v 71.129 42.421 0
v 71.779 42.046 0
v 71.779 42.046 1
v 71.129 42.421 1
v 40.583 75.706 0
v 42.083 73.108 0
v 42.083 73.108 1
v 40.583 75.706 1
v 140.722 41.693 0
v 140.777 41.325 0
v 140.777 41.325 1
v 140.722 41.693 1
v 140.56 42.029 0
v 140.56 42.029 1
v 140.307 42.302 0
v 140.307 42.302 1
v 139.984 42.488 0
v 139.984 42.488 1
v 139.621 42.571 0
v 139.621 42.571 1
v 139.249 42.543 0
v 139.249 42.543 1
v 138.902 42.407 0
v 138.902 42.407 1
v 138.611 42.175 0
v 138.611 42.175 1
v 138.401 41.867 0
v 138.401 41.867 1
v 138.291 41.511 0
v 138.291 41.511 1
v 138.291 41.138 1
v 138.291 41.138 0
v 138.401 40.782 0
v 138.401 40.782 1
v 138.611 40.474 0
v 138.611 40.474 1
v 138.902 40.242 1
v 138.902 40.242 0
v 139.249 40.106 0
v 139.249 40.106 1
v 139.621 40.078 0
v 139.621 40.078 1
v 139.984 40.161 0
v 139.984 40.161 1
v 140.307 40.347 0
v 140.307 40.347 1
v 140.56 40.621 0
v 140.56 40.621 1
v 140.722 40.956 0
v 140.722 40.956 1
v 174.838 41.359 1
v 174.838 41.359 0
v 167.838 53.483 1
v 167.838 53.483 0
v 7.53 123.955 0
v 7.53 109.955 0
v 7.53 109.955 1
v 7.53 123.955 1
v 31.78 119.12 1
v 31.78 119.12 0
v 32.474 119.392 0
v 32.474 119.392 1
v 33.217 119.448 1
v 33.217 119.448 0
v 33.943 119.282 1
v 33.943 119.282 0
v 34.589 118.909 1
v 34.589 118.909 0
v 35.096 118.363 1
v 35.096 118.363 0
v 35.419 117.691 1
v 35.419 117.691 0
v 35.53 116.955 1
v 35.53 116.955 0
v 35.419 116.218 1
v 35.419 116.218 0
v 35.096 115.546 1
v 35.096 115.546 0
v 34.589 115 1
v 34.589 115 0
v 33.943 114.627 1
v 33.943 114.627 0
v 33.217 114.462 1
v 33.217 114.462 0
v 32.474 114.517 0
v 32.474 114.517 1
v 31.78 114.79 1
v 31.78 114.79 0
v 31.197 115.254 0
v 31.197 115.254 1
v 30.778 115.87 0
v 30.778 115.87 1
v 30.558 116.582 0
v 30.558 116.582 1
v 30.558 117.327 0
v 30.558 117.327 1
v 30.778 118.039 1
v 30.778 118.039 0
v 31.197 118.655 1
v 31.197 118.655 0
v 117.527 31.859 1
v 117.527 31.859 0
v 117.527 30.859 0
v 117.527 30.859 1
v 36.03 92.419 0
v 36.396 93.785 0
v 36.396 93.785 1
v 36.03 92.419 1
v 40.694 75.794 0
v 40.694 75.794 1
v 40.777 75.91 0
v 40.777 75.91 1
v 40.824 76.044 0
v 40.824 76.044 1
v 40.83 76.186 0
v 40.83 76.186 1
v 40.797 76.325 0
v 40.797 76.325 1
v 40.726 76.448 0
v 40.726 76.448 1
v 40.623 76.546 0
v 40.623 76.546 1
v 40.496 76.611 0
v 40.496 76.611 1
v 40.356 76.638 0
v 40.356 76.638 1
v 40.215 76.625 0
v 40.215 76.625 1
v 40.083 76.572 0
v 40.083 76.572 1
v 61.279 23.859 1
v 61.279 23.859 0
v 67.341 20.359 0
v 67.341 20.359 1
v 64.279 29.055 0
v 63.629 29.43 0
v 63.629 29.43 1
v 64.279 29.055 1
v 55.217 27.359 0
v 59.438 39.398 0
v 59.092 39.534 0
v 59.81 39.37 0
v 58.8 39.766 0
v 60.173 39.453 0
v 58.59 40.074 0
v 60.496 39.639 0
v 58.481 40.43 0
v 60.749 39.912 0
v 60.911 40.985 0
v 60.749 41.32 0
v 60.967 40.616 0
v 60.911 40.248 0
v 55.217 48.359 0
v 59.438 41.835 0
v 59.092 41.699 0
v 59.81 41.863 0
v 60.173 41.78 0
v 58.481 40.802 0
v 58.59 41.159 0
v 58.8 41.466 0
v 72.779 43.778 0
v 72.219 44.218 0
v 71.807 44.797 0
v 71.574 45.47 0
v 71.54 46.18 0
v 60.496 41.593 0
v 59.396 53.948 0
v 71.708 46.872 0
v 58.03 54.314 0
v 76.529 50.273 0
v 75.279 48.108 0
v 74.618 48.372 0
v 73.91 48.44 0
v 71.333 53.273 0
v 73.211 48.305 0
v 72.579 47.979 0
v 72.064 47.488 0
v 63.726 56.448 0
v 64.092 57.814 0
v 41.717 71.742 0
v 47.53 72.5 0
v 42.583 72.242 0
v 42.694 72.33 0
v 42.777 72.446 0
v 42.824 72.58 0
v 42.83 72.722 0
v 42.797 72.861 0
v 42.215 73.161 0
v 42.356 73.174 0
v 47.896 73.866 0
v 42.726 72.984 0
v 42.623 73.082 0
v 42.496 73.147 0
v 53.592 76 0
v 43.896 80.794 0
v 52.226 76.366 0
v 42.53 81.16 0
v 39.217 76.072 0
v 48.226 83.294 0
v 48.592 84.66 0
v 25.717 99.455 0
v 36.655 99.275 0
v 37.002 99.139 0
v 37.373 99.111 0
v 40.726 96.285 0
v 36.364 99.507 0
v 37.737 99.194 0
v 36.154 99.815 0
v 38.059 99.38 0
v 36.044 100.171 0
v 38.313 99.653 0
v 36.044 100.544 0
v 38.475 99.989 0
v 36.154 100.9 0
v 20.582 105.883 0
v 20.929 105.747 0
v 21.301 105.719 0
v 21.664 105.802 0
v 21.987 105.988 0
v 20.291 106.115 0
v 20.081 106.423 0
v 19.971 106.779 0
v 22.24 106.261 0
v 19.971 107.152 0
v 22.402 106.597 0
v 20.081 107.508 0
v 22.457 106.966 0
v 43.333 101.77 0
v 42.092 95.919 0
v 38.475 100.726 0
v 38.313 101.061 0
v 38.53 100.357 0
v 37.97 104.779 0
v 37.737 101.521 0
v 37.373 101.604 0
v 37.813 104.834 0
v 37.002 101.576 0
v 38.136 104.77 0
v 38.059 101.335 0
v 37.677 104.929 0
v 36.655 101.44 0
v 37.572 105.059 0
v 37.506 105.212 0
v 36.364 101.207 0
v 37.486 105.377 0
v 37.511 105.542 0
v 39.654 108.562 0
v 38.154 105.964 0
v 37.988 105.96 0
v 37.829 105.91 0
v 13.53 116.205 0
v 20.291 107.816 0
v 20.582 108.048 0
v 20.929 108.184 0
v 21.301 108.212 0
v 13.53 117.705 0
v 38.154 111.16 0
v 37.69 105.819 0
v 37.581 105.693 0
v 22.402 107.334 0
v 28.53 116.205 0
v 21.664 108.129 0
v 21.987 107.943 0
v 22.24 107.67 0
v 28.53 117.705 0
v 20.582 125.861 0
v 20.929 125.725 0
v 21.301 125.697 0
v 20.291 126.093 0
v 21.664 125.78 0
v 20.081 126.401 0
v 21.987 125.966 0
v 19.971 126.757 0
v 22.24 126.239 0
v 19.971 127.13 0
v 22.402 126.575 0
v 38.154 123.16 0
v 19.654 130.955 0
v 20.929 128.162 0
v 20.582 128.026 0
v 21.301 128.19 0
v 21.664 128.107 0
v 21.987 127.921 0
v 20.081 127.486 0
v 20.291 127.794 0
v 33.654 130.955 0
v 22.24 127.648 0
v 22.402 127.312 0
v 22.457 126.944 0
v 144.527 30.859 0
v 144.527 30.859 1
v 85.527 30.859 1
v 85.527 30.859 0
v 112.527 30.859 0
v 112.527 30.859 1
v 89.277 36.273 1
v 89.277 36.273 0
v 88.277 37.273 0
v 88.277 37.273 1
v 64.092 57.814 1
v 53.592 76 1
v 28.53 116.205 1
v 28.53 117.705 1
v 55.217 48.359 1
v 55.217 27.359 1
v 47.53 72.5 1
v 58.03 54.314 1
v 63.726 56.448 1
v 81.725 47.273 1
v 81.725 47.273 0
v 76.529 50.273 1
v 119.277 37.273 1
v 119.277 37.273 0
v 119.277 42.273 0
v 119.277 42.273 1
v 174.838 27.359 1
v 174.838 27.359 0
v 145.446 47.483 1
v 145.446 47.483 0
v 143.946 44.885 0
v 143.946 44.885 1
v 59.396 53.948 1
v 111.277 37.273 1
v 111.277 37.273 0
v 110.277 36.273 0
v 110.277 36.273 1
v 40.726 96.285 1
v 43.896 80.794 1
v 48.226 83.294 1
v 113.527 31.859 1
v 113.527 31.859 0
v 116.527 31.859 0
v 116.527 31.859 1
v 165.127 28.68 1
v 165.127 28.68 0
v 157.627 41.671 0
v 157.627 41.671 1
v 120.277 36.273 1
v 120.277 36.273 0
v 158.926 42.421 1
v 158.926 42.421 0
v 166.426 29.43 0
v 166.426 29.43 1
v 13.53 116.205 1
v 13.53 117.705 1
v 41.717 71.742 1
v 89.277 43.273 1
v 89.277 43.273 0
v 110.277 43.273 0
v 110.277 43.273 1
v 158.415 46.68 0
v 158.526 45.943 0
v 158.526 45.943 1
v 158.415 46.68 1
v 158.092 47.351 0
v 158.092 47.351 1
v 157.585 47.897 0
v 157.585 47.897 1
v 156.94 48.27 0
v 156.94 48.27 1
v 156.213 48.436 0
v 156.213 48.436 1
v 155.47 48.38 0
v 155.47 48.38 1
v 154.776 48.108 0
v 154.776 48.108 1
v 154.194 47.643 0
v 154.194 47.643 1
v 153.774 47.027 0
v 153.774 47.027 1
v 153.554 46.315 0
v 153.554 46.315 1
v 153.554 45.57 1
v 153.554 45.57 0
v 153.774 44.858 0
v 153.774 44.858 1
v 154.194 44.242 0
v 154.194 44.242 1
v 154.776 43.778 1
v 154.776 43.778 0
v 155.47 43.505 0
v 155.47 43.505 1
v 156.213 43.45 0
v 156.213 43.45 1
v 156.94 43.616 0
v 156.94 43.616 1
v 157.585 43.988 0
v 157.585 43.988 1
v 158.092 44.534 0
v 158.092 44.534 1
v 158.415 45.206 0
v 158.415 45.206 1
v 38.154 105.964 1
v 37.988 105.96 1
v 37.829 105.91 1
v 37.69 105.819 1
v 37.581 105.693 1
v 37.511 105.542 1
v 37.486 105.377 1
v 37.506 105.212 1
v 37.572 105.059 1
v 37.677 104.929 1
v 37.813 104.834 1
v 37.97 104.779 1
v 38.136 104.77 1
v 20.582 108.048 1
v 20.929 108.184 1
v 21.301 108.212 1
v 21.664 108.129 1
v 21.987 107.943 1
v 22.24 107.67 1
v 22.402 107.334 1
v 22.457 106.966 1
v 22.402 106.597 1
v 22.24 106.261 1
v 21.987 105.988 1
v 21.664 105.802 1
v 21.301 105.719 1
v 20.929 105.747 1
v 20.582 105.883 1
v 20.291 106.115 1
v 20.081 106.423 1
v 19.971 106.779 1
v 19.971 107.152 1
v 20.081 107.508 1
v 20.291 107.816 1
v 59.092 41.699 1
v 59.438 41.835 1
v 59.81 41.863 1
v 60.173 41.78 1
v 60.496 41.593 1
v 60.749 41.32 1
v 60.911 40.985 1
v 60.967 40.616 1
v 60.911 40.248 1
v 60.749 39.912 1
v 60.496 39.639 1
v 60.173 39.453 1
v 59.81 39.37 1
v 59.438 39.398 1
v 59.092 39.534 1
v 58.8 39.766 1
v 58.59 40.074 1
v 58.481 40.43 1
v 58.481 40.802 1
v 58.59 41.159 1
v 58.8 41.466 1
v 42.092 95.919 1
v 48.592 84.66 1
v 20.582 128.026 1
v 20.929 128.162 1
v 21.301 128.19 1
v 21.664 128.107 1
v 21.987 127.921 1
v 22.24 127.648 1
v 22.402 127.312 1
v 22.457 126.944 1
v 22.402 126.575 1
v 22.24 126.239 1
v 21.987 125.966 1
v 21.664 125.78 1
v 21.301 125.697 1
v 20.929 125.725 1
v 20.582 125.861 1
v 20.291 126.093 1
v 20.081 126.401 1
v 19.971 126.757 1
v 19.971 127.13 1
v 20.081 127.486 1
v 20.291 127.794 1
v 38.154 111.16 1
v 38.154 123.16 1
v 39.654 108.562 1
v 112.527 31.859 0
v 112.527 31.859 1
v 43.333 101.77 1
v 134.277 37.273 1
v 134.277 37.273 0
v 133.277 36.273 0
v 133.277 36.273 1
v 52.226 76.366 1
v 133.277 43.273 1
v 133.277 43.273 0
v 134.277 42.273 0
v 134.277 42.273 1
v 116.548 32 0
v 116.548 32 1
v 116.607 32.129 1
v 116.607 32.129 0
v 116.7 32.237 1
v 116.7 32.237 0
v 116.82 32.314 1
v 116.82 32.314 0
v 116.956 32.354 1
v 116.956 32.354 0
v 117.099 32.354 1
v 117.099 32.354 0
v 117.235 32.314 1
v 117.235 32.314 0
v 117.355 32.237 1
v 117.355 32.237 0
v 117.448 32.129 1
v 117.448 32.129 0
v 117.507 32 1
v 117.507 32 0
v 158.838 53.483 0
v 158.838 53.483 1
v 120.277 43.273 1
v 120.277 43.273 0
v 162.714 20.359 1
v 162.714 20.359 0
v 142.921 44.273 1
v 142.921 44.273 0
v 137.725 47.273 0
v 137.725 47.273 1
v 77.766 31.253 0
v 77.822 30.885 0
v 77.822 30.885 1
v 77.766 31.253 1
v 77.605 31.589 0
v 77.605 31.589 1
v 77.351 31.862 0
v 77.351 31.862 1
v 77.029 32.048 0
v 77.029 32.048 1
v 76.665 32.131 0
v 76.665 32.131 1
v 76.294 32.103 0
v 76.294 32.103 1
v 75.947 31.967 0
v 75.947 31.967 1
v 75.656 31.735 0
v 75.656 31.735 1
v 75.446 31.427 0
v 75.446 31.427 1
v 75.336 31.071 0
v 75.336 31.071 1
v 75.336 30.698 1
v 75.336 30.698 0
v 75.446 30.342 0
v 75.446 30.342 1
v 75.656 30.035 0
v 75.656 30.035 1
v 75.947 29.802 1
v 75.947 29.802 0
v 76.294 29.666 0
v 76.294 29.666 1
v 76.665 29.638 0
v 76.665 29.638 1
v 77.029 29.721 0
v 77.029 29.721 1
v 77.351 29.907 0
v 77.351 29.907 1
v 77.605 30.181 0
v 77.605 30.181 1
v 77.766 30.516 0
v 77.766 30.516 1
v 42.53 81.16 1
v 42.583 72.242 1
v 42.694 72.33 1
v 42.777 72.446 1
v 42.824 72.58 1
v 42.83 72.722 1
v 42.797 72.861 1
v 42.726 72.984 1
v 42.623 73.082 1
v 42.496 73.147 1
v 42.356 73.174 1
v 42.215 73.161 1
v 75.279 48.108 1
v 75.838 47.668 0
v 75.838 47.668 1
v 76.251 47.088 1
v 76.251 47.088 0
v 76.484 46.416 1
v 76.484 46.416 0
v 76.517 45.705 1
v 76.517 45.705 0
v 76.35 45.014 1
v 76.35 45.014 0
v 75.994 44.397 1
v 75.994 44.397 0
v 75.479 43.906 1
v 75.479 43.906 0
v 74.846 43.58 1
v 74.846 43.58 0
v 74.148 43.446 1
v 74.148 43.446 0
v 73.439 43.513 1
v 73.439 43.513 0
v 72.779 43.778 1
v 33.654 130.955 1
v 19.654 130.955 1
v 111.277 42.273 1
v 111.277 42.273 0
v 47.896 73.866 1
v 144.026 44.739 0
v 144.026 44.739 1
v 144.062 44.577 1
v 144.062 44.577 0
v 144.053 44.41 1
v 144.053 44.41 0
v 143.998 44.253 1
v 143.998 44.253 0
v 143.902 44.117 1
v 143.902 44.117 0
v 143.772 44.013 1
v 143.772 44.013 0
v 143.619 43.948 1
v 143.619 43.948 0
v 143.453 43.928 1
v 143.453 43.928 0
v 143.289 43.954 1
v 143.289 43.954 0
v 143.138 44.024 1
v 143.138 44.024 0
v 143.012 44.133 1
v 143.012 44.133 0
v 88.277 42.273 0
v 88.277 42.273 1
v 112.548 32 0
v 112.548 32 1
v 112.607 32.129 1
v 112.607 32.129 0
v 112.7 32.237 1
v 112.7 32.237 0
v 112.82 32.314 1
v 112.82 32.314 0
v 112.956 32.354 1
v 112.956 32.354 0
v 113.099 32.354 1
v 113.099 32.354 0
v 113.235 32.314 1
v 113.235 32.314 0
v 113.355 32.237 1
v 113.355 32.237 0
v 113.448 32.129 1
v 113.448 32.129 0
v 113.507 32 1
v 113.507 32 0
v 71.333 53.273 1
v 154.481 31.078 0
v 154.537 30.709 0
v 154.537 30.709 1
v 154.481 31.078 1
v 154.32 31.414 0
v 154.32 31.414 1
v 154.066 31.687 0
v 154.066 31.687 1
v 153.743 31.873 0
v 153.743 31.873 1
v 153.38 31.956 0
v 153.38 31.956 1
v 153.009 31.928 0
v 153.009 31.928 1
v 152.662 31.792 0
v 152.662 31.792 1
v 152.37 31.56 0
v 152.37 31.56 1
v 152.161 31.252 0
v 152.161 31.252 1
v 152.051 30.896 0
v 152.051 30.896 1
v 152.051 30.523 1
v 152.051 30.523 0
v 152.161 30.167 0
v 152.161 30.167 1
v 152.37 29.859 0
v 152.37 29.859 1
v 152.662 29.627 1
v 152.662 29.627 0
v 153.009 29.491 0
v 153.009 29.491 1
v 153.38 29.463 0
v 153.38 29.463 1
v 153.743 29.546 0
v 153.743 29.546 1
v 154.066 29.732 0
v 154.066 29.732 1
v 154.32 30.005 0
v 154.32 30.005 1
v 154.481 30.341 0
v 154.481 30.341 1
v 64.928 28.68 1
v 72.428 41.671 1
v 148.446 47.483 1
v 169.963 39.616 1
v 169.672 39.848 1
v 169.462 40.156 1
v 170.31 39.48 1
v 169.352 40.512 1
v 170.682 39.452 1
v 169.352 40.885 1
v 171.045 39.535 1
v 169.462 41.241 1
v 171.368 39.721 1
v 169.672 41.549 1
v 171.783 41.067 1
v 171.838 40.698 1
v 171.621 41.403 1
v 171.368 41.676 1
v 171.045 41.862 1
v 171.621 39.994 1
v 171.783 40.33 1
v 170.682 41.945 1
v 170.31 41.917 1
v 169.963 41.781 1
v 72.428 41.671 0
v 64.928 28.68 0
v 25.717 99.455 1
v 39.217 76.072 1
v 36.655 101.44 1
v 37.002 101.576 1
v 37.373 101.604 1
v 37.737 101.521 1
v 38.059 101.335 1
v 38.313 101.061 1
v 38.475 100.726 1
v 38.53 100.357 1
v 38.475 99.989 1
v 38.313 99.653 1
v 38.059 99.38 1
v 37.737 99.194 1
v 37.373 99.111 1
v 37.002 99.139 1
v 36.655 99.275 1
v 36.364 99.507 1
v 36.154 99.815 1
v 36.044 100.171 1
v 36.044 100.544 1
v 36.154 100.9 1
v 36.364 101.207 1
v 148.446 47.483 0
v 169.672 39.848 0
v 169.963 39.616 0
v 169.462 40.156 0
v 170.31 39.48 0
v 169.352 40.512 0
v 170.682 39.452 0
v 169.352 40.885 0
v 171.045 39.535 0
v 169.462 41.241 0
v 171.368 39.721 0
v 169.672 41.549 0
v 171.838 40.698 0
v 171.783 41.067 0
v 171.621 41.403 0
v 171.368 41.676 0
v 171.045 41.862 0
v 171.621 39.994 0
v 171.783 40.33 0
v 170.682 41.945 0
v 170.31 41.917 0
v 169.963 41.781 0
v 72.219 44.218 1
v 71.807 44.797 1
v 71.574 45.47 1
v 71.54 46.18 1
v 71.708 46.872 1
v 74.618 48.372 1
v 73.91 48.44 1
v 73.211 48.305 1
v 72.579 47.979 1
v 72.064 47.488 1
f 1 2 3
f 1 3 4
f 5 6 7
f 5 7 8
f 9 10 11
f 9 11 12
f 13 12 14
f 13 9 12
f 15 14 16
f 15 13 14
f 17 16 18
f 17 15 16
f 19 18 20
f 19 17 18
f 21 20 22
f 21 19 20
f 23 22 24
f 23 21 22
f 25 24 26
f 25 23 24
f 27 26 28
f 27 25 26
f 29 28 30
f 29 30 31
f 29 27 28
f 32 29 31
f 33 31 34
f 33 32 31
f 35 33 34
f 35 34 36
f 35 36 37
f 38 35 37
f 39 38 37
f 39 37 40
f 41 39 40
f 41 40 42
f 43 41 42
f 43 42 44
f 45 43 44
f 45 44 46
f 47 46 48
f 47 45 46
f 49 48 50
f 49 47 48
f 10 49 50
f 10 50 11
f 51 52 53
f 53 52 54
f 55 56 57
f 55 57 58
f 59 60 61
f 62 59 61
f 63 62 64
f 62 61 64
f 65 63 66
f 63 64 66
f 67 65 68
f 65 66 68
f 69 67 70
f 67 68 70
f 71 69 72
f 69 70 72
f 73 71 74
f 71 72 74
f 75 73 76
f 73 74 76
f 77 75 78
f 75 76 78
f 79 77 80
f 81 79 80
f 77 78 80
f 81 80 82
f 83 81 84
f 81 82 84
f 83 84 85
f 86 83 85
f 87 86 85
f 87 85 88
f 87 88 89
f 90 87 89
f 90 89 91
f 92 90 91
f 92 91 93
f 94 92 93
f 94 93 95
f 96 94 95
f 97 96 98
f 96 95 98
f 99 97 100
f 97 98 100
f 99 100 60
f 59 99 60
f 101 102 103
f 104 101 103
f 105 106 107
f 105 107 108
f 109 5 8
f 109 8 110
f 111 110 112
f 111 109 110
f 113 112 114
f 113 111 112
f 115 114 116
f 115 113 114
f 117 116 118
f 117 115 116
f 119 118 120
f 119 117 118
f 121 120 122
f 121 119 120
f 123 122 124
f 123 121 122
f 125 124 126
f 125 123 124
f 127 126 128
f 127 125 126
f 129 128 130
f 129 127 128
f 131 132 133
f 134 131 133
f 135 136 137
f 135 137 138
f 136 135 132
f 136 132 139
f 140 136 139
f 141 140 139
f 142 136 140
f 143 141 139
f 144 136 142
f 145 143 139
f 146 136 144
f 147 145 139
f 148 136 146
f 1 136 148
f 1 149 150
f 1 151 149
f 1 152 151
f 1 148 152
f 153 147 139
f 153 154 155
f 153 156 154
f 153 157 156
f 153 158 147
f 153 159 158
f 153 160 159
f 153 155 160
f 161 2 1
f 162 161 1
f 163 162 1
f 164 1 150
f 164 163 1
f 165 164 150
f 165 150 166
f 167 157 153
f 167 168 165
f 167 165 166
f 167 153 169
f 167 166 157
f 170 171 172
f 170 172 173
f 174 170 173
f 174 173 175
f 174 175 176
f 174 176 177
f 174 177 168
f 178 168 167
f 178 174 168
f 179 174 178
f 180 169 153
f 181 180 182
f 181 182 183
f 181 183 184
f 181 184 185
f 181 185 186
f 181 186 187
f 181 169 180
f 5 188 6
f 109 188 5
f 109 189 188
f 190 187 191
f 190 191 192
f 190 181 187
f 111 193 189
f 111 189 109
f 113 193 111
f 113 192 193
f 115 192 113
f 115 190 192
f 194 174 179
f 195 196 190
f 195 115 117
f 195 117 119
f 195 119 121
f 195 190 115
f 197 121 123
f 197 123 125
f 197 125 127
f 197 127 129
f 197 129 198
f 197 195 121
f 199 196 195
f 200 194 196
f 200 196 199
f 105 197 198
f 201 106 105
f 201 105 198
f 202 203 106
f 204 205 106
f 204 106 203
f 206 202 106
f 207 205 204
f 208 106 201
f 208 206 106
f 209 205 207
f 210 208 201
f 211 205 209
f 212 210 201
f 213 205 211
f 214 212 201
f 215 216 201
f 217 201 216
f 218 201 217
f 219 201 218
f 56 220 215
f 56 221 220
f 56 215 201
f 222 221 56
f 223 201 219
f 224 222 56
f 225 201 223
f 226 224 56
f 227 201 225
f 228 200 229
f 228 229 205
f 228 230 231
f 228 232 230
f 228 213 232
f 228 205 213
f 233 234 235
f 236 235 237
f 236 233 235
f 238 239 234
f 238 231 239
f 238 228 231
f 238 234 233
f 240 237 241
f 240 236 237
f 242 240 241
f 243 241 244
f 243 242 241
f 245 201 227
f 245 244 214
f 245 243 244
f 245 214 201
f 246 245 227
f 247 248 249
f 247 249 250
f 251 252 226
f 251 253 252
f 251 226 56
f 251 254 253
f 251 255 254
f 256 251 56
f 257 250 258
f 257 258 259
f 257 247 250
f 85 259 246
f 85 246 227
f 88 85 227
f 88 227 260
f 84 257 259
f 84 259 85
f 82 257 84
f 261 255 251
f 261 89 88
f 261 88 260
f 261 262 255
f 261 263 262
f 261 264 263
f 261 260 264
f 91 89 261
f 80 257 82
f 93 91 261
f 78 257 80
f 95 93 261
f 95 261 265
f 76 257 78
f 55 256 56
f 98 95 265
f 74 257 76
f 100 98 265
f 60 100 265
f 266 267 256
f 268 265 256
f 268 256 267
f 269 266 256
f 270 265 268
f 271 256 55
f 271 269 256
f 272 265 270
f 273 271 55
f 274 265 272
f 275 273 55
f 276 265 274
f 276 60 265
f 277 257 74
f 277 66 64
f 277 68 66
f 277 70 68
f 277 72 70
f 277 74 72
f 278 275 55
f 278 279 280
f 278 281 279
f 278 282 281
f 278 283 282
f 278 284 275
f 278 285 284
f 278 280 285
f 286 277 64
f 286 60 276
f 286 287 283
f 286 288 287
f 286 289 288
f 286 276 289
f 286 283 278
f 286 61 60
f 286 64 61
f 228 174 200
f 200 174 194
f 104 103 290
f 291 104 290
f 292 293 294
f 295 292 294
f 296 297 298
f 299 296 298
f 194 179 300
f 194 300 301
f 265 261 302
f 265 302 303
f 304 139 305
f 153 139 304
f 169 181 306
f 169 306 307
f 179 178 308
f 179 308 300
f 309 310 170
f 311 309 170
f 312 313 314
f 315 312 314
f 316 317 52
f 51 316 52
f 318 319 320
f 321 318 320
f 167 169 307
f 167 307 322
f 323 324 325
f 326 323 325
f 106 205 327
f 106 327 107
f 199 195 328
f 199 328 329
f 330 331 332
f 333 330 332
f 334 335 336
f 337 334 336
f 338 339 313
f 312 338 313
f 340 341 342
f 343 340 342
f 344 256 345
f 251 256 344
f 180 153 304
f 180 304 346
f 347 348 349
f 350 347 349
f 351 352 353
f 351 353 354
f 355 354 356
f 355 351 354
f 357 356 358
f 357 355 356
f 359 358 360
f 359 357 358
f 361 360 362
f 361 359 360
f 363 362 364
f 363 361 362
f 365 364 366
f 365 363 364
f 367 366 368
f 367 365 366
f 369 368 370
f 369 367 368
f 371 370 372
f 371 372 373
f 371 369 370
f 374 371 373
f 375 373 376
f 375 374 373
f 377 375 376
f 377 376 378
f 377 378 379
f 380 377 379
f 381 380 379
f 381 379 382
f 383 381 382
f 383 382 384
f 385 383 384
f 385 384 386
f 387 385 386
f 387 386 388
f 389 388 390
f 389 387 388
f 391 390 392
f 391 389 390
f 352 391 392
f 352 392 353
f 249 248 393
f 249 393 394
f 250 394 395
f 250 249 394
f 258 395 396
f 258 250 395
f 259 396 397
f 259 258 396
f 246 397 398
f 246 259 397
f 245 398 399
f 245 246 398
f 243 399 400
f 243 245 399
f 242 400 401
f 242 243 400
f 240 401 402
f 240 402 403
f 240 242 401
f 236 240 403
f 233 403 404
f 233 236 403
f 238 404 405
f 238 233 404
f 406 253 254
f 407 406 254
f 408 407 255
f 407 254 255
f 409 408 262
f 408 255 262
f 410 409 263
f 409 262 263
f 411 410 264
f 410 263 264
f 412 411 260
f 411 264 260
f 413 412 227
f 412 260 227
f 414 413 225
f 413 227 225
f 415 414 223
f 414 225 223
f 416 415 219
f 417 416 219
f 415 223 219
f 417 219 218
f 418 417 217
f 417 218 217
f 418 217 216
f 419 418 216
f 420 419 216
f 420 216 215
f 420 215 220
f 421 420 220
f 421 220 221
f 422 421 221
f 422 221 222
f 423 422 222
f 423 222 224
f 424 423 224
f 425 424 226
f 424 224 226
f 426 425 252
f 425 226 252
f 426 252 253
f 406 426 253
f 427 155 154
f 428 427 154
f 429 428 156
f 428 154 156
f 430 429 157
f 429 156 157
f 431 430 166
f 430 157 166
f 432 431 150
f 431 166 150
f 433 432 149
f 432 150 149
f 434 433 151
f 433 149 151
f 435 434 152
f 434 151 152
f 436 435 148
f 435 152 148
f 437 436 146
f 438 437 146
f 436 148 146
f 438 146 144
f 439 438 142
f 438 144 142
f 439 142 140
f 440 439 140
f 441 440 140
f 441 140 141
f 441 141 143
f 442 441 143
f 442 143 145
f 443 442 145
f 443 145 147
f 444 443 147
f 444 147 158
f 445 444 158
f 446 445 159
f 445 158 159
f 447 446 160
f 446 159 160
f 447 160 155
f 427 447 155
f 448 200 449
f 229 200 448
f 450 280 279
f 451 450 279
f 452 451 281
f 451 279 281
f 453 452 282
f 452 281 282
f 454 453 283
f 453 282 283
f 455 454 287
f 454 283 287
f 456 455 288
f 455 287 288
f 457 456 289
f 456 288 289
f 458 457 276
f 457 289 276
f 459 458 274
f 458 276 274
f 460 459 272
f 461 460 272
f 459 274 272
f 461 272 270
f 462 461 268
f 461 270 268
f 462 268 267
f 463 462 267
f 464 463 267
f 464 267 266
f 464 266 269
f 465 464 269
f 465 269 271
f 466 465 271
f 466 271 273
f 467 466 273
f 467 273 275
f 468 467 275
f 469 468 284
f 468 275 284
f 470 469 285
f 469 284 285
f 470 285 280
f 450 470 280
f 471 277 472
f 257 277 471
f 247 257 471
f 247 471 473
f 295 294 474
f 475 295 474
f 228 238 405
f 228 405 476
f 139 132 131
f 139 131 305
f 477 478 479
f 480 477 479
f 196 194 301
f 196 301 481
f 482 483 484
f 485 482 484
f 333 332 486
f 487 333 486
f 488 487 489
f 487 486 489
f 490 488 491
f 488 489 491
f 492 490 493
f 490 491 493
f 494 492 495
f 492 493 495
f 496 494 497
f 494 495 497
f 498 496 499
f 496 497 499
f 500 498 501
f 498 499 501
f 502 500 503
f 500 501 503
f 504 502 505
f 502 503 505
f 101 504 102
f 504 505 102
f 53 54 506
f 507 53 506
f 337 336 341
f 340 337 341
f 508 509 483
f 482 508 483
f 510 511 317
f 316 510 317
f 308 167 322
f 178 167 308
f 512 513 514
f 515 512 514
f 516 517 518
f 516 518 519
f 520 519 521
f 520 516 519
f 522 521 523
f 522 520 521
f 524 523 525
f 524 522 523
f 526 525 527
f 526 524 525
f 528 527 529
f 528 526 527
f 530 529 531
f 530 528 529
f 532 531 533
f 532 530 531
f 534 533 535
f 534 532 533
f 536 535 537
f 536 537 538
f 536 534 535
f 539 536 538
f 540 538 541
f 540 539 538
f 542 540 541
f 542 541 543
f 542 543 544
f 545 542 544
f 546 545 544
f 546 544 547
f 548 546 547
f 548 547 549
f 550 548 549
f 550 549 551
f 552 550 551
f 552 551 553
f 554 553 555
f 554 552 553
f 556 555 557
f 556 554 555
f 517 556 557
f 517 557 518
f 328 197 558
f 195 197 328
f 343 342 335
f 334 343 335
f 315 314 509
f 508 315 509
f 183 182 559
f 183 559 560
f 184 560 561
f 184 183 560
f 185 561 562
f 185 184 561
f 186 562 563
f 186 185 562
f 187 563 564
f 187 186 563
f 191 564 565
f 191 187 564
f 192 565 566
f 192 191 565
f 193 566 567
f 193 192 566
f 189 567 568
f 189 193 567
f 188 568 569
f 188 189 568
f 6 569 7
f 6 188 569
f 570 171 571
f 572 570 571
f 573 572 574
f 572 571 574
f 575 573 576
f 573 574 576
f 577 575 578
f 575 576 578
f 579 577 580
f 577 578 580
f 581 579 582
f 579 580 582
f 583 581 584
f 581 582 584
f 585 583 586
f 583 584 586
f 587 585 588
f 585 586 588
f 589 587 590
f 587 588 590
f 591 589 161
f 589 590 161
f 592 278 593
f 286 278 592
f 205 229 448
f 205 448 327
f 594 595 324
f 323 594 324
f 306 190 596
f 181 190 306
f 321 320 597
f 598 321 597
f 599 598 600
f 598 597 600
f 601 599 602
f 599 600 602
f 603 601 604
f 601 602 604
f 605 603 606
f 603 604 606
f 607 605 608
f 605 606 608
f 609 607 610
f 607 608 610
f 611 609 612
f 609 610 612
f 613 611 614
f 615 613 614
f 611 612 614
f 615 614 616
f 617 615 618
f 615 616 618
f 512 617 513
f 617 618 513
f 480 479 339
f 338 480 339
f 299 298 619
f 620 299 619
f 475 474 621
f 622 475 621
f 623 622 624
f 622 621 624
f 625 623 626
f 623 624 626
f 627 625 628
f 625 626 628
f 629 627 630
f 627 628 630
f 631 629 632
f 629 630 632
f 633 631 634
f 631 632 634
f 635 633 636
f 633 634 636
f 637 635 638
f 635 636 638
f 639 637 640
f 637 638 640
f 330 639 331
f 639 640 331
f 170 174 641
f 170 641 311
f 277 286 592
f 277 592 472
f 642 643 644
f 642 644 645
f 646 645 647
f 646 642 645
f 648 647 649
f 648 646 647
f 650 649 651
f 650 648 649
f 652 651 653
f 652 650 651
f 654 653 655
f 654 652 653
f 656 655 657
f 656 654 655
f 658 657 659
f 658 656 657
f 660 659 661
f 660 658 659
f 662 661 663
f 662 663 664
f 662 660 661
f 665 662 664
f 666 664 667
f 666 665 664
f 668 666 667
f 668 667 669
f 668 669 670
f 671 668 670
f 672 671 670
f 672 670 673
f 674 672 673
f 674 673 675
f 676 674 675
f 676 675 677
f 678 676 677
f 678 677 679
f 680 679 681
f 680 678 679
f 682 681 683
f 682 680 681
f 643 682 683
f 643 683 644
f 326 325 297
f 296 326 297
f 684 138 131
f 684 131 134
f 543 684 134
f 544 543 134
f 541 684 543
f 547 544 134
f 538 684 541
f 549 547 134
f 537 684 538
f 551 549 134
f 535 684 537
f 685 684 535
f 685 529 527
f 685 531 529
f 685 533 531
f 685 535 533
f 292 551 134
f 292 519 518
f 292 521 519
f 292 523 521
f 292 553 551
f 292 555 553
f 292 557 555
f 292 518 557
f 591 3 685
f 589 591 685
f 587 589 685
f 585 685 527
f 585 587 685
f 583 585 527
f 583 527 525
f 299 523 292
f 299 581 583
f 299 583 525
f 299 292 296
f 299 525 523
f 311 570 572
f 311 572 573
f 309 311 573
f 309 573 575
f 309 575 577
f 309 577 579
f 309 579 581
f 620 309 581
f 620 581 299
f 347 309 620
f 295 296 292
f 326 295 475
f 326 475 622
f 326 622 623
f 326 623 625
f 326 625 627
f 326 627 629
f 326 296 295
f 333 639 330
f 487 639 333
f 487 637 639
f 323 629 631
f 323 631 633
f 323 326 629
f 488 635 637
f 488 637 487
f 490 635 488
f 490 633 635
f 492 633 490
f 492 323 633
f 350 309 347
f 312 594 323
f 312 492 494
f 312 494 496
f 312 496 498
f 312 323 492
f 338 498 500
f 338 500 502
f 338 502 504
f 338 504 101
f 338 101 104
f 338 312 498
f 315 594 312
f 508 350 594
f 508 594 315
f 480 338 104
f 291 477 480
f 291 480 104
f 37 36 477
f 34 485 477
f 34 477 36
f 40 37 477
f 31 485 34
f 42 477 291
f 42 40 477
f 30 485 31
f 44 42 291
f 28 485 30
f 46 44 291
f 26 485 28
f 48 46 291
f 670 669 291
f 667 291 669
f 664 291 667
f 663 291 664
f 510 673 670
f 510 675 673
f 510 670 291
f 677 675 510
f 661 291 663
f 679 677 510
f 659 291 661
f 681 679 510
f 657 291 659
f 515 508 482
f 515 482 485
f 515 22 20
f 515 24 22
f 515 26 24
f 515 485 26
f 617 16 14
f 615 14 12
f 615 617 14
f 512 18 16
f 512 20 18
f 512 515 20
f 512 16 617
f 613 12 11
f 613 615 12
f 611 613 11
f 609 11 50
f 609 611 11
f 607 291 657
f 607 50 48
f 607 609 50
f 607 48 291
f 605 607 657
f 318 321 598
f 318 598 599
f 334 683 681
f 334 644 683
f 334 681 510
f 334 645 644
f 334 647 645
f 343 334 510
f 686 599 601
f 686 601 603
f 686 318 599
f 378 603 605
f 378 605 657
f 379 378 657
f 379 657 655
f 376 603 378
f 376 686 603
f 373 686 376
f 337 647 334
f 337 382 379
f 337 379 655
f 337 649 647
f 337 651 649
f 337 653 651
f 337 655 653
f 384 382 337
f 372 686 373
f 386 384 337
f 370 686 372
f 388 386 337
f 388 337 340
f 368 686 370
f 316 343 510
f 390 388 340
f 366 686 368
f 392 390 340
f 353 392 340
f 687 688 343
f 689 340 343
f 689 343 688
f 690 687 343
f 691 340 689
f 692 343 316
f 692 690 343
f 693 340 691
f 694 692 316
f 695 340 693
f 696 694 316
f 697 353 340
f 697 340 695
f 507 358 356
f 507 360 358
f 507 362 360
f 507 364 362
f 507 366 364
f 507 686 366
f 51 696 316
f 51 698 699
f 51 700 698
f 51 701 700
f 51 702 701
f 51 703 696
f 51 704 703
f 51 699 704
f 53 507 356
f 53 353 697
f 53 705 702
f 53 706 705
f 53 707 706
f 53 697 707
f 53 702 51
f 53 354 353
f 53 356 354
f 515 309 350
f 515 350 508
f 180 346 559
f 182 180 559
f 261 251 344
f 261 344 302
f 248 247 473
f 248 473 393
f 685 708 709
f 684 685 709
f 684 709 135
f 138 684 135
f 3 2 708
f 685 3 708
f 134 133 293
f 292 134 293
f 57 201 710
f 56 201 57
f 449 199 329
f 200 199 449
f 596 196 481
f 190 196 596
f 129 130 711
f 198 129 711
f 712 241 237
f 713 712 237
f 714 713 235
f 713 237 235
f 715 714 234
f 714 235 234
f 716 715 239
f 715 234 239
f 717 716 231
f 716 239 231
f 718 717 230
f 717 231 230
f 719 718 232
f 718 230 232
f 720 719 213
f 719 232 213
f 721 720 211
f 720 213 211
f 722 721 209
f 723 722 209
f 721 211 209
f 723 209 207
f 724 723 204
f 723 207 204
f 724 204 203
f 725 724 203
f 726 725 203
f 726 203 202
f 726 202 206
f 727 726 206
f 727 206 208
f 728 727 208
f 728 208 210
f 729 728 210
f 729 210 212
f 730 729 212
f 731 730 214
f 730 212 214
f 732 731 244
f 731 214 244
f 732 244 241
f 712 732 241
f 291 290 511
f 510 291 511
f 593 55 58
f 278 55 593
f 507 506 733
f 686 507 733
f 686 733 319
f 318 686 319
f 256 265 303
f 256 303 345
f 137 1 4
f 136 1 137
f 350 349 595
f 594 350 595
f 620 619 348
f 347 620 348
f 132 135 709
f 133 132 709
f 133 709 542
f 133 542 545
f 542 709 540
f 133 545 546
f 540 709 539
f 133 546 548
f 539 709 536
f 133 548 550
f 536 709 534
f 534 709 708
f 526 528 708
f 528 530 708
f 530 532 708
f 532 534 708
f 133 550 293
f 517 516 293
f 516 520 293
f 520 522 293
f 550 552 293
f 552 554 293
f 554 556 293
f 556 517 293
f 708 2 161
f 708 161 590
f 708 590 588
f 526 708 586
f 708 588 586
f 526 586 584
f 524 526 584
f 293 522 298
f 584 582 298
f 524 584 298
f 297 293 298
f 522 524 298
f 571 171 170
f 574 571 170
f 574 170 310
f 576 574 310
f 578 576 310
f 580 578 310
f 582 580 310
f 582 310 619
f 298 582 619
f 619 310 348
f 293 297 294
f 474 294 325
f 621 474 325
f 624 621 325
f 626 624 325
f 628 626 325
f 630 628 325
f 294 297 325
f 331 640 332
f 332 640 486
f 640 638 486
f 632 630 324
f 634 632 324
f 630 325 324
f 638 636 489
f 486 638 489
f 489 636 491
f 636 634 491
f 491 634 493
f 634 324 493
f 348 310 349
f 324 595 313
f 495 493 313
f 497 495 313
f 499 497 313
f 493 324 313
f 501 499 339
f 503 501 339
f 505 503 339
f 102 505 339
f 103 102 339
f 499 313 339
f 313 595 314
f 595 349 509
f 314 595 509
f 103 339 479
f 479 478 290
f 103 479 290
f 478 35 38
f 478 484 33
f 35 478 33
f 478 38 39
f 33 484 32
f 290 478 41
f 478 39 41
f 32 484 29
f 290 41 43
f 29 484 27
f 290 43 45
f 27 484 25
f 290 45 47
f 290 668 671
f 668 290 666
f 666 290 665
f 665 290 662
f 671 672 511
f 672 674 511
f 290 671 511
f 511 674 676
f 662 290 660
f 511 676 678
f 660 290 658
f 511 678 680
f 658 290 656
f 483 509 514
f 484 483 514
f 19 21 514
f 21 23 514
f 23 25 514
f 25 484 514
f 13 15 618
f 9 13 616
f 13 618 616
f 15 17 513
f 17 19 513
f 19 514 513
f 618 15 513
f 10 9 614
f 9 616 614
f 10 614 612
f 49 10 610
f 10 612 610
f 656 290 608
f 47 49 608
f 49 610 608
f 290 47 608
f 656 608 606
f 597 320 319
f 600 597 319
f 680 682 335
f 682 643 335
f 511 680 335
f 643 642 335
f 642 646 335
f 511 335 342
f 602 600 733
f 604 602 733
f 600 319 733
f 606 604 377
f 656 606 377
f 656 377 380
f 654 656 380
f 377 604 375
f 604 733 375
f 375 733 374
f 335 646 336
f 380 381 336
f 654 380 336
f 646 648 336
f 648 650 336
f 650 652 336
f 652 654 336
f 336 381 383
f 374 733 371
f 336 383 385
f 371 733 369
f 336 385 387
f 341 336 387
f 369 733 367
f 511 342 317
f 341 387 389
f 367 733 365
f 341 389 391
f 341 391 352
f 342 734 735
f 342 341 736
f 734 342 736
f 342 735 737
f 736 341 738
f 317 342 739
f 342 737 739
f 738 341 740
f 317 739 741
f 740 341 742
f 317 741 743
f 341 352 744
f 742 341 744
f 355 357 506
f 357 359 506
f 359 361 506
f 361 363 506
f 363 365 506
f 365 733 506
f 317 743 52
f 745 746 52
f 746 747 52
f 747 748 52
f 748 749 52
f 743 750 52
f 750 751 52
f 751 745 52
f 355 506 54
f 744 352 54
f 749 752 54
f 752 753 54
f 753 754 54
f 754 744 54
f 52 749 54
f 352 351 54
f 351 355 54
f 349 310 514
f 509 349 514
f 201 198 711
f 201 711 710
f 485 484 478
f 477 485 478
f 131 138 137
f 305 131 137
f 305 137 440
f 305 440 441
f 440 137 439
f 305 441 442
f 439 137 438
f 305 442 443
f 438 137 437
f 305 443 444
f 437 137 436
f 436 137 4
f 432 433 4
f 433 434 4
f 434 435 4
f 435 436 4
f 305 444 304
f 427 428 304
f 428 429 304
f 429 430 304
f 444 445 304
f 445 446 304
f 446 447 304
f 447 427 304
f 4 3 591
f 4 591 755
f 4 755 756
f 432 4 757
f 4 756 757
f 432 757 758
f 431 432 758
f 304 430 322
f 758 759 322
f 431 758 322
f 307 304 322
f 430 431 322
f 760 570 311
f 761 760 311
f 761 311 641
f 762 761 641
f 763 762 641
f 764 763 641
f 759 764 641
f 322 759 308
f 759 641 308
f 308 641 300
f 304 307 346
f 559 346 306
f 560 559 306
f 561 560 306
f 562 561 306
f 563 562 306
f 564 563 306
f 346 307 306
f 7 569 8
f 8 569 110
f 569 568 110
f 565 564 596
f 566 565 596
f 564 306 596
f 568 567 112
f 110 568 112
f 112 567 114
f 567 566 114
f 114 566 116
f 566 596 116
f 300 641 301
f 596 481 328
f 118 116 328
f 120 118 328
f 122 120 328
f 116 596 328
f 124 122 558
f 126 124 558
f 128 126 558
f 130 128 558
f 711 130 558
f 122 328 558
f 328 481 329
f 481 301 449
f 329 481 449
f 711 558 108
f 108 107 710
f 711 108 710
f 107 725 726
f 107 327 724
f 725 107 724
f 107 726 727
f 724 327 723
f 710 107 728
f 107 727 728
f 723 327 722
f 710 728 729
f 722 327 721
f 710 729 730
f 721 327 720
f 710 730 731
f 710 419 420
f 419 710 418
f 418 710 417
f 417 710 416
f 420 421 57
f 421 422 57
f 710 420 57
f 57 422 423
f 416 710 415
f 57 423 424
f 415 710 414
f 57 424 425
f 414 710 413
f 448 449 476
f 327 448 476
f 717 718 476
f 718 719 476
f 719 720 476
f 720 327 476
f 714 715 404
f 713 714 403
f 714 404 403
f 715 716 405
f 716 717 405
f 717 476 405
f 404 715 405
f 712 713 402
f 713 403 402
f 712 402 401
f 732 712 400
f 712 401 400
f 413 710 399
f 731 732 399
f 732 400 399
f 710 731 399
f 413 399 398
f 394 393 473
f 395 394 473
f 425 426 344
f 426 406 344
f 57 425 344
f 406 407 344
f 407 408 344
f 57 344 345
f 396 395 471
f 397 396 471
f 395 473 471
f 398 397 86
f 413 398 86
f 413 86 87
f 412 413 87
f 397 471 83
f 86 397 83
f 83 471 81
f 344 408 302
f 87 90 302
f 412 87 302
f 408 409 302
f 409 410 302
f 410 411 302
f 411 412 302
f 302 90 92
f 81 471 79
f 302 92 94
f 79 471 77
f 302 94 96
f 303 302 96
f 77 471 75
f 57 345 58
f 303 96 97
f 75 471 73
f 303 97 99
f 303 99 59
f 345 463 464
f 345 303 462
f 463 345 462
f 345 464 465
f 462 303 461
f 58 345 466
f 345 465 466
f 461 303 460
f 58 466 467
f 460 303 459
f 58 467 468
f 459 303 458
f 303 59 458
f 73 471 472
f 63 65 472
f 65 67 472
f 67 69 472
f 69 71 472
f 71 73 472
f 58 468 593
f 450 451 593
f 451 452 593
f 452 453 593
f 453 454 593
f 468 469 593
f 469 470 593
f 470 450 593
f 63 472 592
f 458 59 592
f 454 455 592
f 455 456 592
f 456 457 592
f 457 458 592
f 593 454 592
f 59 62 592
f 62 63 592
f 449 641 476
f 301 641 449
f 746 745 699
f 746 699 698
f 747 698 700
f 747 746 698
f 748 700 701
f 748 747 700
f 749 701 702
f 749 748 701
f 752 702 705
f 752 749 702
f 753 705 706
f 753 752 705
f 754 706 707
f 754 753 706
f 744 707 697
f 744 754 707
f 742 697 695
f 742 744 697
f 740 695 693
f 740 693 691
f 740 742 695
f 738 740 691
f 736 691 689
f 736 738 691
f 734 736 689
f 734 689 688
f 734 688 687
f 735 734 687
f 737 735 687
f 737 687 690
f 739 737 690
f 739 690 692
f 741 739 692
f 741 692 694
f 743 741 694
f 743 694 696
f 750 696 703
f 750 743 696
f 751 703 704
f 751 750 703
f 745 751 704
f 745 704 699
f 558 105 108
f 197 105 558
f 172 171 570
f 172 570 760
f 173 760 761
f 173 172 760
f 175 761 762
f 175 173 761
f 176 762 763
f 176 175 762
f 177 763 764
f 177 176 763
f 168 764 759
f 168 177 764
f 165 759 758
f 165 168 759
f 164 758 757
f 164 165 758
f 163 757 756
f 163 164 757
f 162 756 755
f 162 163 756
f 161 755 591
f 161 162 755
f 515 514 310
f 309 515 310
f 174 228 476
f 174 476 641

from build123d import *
from build123d.topology import SkipClean

# Parameters (mm, degrees)
CROQUIS1_R              = 1.25
CROQUIS1_R_2            = 2.5
SALIENTE_EXTRUIR1_DEPTH = 1


with BuildPart() as part:
    # Croquis1 → Saliente-Extruir1 (new body)
    with BuildSketch(Plane.XY):
        with BuildLine():
            Line((64.278746094, 29.055249422), (61.278746094, 23.859096999))
            Line((61.278746094, 23.859096999), (67.340923921, 20.359096999))
            Line((67.340923921, 20.359096999), (85.5274574, 30.859096999))
            Line((85.5274574, 30.859096999), (112.5274574, 30.859096999))
            Line((112.5274574, 30.859096999), (112.5274574, 31.859096999))
            ThreePointArc((112.5274574, 31.859096999), (113.027457314, 32.359096999), (113.527457227, 31.859096999))
            Line((113.527457227, 31.859096999), (116.527457227, 31.859096999))
            ThreePointArc((116.527457227, 31.859096999), (117.027457227, 32.359096999), (117.527457227, 31.859096999))
            Line((117.527457227, 31.859096999), (117.527457227, 30.859096999))
            Line((117.527457227, 30.859096999), (144.527457227, 30.859096999))
            Line((144.527457227, 30.859096999), (162.713990707, 20.359096999))
            Line((162.713990707, 20.359096999), (174.83834636, 27.359096999))
            Line((174.83834636, 27.359096999), (174.83834636, 41.359096999))
            Line((174.83834636, 41.359096999), (167.83834636, 53.483452652))
            Line((167.83834636, 53.483452652), (158.83834636, 53.483452652))
            Line((158.83834636, 53.483452652), (148.446041514, 47.483452652))
            Line((148.446041514, 47.483452652), (145.446041514, 47.483452652))
            Line((145.446041514, 47.483452652), (143.946041514, 44.88537644))
            ThreePointArc((143.946041514, 44.88537644), (143.77192137, 44.012873167), (142.92105094, 44.272871814))
            Line((142.92105094, 44.272871814), (137.724898517, 47.272871814))
            Line((137.724898517, 47.272871814), (81.724898517, 47.272871814))
            Line((81.724898517, 47.272871814), (76.528746094, 50.272871814))
            Line((76.528746094, 50.272871814), (75.278746094, 48.107808305))
            ThreePointArc((75.278746094, 48.107808305), (76.193809604, 44.692744795), (72.778746094, 43.777681286))
            Line((72.778746094, 43.777681286), (71.778746094, 42.045630478))
            Line((71.778746094, 42.045630478), (72.428265147, 41.670630478))
            Line((72.428265147, 41.670630478), (64.928265147, 28.680249422))
            Line((64.928265147, 28.680249422), (64.278746094, 29.055249422))
        make_face()
        with Locations((76.571886424, 30.884748108)):
            Circle(CROQUIS1_R, mode=Mode.SUBTRACT)
        with Locations((153.286799356, 30.709365751)):
            Circle(CROQUIS1_R, mode=Mode.SUBTRACT)
        Polygon((166.425687586, 29.430249422), (165.776168533, 29.055249422), (165.12664948, 28.680249422), (157.62664948, 41.670630478), (158.276168533, 42.045630478), (158.925687586, 42.420630478), align=None, mode=Mode.SUBTRACT)
        Polygon((88.277457227, 42.272871814), (89.277457227, 43.272871814), (110.277457227, 43.272871814), (111.277457227, 42.272871814), (111.277457227, 37.272871814), (110.277457227, 36.272871814), (89.277457227, 36.272871814), (88.277457227, 37.272871814), align=None, mode=Mode.SUBTRACT)
        Polygon((119.277457227, 42.272871814), (120.277457227, 43.272871814), (133.277457227, 43.272871814), (134.277457227, 42.272871814), (134.277457227, 37.272871814), (133.277457227, 36.272871814), (120.277457227, 36.272871814), (119.277457227, 37.272871814), align=None, mode=Mode.SUBTRACT)
        with Locations((139.527457227, 41.32468677)):
            Circle(CROQUIS1_R, mode=Mode.SUBTRACT)
        with Locations((170.58834636, 40.698418571)):
            Circle(CROQUIS1_R, mode=Mode.SUBTRACT)
        with Locations((156.026168533, 45.942744795)):
            Circle(CROQUIS1_R_2, mode=Mode.SUBTRACT)
    saliente_extruir1 = extrude(amount=SALIENTE_EXTRUIR1_DEPTH)

    # Simetría2: Saliente-Extruir1 across plane
    with SkipClean():  # the faces are left unmerged after this step: merging them gives an invalid solid
        add(saliente_extruir1.mirror(Plane(origin=(35.627767514, -20.569701165, 1), x_dir=(0, 0, 1), z_dir=(0.8660254037844365, -0.5000000000000039, 0))))


solid = part.part
